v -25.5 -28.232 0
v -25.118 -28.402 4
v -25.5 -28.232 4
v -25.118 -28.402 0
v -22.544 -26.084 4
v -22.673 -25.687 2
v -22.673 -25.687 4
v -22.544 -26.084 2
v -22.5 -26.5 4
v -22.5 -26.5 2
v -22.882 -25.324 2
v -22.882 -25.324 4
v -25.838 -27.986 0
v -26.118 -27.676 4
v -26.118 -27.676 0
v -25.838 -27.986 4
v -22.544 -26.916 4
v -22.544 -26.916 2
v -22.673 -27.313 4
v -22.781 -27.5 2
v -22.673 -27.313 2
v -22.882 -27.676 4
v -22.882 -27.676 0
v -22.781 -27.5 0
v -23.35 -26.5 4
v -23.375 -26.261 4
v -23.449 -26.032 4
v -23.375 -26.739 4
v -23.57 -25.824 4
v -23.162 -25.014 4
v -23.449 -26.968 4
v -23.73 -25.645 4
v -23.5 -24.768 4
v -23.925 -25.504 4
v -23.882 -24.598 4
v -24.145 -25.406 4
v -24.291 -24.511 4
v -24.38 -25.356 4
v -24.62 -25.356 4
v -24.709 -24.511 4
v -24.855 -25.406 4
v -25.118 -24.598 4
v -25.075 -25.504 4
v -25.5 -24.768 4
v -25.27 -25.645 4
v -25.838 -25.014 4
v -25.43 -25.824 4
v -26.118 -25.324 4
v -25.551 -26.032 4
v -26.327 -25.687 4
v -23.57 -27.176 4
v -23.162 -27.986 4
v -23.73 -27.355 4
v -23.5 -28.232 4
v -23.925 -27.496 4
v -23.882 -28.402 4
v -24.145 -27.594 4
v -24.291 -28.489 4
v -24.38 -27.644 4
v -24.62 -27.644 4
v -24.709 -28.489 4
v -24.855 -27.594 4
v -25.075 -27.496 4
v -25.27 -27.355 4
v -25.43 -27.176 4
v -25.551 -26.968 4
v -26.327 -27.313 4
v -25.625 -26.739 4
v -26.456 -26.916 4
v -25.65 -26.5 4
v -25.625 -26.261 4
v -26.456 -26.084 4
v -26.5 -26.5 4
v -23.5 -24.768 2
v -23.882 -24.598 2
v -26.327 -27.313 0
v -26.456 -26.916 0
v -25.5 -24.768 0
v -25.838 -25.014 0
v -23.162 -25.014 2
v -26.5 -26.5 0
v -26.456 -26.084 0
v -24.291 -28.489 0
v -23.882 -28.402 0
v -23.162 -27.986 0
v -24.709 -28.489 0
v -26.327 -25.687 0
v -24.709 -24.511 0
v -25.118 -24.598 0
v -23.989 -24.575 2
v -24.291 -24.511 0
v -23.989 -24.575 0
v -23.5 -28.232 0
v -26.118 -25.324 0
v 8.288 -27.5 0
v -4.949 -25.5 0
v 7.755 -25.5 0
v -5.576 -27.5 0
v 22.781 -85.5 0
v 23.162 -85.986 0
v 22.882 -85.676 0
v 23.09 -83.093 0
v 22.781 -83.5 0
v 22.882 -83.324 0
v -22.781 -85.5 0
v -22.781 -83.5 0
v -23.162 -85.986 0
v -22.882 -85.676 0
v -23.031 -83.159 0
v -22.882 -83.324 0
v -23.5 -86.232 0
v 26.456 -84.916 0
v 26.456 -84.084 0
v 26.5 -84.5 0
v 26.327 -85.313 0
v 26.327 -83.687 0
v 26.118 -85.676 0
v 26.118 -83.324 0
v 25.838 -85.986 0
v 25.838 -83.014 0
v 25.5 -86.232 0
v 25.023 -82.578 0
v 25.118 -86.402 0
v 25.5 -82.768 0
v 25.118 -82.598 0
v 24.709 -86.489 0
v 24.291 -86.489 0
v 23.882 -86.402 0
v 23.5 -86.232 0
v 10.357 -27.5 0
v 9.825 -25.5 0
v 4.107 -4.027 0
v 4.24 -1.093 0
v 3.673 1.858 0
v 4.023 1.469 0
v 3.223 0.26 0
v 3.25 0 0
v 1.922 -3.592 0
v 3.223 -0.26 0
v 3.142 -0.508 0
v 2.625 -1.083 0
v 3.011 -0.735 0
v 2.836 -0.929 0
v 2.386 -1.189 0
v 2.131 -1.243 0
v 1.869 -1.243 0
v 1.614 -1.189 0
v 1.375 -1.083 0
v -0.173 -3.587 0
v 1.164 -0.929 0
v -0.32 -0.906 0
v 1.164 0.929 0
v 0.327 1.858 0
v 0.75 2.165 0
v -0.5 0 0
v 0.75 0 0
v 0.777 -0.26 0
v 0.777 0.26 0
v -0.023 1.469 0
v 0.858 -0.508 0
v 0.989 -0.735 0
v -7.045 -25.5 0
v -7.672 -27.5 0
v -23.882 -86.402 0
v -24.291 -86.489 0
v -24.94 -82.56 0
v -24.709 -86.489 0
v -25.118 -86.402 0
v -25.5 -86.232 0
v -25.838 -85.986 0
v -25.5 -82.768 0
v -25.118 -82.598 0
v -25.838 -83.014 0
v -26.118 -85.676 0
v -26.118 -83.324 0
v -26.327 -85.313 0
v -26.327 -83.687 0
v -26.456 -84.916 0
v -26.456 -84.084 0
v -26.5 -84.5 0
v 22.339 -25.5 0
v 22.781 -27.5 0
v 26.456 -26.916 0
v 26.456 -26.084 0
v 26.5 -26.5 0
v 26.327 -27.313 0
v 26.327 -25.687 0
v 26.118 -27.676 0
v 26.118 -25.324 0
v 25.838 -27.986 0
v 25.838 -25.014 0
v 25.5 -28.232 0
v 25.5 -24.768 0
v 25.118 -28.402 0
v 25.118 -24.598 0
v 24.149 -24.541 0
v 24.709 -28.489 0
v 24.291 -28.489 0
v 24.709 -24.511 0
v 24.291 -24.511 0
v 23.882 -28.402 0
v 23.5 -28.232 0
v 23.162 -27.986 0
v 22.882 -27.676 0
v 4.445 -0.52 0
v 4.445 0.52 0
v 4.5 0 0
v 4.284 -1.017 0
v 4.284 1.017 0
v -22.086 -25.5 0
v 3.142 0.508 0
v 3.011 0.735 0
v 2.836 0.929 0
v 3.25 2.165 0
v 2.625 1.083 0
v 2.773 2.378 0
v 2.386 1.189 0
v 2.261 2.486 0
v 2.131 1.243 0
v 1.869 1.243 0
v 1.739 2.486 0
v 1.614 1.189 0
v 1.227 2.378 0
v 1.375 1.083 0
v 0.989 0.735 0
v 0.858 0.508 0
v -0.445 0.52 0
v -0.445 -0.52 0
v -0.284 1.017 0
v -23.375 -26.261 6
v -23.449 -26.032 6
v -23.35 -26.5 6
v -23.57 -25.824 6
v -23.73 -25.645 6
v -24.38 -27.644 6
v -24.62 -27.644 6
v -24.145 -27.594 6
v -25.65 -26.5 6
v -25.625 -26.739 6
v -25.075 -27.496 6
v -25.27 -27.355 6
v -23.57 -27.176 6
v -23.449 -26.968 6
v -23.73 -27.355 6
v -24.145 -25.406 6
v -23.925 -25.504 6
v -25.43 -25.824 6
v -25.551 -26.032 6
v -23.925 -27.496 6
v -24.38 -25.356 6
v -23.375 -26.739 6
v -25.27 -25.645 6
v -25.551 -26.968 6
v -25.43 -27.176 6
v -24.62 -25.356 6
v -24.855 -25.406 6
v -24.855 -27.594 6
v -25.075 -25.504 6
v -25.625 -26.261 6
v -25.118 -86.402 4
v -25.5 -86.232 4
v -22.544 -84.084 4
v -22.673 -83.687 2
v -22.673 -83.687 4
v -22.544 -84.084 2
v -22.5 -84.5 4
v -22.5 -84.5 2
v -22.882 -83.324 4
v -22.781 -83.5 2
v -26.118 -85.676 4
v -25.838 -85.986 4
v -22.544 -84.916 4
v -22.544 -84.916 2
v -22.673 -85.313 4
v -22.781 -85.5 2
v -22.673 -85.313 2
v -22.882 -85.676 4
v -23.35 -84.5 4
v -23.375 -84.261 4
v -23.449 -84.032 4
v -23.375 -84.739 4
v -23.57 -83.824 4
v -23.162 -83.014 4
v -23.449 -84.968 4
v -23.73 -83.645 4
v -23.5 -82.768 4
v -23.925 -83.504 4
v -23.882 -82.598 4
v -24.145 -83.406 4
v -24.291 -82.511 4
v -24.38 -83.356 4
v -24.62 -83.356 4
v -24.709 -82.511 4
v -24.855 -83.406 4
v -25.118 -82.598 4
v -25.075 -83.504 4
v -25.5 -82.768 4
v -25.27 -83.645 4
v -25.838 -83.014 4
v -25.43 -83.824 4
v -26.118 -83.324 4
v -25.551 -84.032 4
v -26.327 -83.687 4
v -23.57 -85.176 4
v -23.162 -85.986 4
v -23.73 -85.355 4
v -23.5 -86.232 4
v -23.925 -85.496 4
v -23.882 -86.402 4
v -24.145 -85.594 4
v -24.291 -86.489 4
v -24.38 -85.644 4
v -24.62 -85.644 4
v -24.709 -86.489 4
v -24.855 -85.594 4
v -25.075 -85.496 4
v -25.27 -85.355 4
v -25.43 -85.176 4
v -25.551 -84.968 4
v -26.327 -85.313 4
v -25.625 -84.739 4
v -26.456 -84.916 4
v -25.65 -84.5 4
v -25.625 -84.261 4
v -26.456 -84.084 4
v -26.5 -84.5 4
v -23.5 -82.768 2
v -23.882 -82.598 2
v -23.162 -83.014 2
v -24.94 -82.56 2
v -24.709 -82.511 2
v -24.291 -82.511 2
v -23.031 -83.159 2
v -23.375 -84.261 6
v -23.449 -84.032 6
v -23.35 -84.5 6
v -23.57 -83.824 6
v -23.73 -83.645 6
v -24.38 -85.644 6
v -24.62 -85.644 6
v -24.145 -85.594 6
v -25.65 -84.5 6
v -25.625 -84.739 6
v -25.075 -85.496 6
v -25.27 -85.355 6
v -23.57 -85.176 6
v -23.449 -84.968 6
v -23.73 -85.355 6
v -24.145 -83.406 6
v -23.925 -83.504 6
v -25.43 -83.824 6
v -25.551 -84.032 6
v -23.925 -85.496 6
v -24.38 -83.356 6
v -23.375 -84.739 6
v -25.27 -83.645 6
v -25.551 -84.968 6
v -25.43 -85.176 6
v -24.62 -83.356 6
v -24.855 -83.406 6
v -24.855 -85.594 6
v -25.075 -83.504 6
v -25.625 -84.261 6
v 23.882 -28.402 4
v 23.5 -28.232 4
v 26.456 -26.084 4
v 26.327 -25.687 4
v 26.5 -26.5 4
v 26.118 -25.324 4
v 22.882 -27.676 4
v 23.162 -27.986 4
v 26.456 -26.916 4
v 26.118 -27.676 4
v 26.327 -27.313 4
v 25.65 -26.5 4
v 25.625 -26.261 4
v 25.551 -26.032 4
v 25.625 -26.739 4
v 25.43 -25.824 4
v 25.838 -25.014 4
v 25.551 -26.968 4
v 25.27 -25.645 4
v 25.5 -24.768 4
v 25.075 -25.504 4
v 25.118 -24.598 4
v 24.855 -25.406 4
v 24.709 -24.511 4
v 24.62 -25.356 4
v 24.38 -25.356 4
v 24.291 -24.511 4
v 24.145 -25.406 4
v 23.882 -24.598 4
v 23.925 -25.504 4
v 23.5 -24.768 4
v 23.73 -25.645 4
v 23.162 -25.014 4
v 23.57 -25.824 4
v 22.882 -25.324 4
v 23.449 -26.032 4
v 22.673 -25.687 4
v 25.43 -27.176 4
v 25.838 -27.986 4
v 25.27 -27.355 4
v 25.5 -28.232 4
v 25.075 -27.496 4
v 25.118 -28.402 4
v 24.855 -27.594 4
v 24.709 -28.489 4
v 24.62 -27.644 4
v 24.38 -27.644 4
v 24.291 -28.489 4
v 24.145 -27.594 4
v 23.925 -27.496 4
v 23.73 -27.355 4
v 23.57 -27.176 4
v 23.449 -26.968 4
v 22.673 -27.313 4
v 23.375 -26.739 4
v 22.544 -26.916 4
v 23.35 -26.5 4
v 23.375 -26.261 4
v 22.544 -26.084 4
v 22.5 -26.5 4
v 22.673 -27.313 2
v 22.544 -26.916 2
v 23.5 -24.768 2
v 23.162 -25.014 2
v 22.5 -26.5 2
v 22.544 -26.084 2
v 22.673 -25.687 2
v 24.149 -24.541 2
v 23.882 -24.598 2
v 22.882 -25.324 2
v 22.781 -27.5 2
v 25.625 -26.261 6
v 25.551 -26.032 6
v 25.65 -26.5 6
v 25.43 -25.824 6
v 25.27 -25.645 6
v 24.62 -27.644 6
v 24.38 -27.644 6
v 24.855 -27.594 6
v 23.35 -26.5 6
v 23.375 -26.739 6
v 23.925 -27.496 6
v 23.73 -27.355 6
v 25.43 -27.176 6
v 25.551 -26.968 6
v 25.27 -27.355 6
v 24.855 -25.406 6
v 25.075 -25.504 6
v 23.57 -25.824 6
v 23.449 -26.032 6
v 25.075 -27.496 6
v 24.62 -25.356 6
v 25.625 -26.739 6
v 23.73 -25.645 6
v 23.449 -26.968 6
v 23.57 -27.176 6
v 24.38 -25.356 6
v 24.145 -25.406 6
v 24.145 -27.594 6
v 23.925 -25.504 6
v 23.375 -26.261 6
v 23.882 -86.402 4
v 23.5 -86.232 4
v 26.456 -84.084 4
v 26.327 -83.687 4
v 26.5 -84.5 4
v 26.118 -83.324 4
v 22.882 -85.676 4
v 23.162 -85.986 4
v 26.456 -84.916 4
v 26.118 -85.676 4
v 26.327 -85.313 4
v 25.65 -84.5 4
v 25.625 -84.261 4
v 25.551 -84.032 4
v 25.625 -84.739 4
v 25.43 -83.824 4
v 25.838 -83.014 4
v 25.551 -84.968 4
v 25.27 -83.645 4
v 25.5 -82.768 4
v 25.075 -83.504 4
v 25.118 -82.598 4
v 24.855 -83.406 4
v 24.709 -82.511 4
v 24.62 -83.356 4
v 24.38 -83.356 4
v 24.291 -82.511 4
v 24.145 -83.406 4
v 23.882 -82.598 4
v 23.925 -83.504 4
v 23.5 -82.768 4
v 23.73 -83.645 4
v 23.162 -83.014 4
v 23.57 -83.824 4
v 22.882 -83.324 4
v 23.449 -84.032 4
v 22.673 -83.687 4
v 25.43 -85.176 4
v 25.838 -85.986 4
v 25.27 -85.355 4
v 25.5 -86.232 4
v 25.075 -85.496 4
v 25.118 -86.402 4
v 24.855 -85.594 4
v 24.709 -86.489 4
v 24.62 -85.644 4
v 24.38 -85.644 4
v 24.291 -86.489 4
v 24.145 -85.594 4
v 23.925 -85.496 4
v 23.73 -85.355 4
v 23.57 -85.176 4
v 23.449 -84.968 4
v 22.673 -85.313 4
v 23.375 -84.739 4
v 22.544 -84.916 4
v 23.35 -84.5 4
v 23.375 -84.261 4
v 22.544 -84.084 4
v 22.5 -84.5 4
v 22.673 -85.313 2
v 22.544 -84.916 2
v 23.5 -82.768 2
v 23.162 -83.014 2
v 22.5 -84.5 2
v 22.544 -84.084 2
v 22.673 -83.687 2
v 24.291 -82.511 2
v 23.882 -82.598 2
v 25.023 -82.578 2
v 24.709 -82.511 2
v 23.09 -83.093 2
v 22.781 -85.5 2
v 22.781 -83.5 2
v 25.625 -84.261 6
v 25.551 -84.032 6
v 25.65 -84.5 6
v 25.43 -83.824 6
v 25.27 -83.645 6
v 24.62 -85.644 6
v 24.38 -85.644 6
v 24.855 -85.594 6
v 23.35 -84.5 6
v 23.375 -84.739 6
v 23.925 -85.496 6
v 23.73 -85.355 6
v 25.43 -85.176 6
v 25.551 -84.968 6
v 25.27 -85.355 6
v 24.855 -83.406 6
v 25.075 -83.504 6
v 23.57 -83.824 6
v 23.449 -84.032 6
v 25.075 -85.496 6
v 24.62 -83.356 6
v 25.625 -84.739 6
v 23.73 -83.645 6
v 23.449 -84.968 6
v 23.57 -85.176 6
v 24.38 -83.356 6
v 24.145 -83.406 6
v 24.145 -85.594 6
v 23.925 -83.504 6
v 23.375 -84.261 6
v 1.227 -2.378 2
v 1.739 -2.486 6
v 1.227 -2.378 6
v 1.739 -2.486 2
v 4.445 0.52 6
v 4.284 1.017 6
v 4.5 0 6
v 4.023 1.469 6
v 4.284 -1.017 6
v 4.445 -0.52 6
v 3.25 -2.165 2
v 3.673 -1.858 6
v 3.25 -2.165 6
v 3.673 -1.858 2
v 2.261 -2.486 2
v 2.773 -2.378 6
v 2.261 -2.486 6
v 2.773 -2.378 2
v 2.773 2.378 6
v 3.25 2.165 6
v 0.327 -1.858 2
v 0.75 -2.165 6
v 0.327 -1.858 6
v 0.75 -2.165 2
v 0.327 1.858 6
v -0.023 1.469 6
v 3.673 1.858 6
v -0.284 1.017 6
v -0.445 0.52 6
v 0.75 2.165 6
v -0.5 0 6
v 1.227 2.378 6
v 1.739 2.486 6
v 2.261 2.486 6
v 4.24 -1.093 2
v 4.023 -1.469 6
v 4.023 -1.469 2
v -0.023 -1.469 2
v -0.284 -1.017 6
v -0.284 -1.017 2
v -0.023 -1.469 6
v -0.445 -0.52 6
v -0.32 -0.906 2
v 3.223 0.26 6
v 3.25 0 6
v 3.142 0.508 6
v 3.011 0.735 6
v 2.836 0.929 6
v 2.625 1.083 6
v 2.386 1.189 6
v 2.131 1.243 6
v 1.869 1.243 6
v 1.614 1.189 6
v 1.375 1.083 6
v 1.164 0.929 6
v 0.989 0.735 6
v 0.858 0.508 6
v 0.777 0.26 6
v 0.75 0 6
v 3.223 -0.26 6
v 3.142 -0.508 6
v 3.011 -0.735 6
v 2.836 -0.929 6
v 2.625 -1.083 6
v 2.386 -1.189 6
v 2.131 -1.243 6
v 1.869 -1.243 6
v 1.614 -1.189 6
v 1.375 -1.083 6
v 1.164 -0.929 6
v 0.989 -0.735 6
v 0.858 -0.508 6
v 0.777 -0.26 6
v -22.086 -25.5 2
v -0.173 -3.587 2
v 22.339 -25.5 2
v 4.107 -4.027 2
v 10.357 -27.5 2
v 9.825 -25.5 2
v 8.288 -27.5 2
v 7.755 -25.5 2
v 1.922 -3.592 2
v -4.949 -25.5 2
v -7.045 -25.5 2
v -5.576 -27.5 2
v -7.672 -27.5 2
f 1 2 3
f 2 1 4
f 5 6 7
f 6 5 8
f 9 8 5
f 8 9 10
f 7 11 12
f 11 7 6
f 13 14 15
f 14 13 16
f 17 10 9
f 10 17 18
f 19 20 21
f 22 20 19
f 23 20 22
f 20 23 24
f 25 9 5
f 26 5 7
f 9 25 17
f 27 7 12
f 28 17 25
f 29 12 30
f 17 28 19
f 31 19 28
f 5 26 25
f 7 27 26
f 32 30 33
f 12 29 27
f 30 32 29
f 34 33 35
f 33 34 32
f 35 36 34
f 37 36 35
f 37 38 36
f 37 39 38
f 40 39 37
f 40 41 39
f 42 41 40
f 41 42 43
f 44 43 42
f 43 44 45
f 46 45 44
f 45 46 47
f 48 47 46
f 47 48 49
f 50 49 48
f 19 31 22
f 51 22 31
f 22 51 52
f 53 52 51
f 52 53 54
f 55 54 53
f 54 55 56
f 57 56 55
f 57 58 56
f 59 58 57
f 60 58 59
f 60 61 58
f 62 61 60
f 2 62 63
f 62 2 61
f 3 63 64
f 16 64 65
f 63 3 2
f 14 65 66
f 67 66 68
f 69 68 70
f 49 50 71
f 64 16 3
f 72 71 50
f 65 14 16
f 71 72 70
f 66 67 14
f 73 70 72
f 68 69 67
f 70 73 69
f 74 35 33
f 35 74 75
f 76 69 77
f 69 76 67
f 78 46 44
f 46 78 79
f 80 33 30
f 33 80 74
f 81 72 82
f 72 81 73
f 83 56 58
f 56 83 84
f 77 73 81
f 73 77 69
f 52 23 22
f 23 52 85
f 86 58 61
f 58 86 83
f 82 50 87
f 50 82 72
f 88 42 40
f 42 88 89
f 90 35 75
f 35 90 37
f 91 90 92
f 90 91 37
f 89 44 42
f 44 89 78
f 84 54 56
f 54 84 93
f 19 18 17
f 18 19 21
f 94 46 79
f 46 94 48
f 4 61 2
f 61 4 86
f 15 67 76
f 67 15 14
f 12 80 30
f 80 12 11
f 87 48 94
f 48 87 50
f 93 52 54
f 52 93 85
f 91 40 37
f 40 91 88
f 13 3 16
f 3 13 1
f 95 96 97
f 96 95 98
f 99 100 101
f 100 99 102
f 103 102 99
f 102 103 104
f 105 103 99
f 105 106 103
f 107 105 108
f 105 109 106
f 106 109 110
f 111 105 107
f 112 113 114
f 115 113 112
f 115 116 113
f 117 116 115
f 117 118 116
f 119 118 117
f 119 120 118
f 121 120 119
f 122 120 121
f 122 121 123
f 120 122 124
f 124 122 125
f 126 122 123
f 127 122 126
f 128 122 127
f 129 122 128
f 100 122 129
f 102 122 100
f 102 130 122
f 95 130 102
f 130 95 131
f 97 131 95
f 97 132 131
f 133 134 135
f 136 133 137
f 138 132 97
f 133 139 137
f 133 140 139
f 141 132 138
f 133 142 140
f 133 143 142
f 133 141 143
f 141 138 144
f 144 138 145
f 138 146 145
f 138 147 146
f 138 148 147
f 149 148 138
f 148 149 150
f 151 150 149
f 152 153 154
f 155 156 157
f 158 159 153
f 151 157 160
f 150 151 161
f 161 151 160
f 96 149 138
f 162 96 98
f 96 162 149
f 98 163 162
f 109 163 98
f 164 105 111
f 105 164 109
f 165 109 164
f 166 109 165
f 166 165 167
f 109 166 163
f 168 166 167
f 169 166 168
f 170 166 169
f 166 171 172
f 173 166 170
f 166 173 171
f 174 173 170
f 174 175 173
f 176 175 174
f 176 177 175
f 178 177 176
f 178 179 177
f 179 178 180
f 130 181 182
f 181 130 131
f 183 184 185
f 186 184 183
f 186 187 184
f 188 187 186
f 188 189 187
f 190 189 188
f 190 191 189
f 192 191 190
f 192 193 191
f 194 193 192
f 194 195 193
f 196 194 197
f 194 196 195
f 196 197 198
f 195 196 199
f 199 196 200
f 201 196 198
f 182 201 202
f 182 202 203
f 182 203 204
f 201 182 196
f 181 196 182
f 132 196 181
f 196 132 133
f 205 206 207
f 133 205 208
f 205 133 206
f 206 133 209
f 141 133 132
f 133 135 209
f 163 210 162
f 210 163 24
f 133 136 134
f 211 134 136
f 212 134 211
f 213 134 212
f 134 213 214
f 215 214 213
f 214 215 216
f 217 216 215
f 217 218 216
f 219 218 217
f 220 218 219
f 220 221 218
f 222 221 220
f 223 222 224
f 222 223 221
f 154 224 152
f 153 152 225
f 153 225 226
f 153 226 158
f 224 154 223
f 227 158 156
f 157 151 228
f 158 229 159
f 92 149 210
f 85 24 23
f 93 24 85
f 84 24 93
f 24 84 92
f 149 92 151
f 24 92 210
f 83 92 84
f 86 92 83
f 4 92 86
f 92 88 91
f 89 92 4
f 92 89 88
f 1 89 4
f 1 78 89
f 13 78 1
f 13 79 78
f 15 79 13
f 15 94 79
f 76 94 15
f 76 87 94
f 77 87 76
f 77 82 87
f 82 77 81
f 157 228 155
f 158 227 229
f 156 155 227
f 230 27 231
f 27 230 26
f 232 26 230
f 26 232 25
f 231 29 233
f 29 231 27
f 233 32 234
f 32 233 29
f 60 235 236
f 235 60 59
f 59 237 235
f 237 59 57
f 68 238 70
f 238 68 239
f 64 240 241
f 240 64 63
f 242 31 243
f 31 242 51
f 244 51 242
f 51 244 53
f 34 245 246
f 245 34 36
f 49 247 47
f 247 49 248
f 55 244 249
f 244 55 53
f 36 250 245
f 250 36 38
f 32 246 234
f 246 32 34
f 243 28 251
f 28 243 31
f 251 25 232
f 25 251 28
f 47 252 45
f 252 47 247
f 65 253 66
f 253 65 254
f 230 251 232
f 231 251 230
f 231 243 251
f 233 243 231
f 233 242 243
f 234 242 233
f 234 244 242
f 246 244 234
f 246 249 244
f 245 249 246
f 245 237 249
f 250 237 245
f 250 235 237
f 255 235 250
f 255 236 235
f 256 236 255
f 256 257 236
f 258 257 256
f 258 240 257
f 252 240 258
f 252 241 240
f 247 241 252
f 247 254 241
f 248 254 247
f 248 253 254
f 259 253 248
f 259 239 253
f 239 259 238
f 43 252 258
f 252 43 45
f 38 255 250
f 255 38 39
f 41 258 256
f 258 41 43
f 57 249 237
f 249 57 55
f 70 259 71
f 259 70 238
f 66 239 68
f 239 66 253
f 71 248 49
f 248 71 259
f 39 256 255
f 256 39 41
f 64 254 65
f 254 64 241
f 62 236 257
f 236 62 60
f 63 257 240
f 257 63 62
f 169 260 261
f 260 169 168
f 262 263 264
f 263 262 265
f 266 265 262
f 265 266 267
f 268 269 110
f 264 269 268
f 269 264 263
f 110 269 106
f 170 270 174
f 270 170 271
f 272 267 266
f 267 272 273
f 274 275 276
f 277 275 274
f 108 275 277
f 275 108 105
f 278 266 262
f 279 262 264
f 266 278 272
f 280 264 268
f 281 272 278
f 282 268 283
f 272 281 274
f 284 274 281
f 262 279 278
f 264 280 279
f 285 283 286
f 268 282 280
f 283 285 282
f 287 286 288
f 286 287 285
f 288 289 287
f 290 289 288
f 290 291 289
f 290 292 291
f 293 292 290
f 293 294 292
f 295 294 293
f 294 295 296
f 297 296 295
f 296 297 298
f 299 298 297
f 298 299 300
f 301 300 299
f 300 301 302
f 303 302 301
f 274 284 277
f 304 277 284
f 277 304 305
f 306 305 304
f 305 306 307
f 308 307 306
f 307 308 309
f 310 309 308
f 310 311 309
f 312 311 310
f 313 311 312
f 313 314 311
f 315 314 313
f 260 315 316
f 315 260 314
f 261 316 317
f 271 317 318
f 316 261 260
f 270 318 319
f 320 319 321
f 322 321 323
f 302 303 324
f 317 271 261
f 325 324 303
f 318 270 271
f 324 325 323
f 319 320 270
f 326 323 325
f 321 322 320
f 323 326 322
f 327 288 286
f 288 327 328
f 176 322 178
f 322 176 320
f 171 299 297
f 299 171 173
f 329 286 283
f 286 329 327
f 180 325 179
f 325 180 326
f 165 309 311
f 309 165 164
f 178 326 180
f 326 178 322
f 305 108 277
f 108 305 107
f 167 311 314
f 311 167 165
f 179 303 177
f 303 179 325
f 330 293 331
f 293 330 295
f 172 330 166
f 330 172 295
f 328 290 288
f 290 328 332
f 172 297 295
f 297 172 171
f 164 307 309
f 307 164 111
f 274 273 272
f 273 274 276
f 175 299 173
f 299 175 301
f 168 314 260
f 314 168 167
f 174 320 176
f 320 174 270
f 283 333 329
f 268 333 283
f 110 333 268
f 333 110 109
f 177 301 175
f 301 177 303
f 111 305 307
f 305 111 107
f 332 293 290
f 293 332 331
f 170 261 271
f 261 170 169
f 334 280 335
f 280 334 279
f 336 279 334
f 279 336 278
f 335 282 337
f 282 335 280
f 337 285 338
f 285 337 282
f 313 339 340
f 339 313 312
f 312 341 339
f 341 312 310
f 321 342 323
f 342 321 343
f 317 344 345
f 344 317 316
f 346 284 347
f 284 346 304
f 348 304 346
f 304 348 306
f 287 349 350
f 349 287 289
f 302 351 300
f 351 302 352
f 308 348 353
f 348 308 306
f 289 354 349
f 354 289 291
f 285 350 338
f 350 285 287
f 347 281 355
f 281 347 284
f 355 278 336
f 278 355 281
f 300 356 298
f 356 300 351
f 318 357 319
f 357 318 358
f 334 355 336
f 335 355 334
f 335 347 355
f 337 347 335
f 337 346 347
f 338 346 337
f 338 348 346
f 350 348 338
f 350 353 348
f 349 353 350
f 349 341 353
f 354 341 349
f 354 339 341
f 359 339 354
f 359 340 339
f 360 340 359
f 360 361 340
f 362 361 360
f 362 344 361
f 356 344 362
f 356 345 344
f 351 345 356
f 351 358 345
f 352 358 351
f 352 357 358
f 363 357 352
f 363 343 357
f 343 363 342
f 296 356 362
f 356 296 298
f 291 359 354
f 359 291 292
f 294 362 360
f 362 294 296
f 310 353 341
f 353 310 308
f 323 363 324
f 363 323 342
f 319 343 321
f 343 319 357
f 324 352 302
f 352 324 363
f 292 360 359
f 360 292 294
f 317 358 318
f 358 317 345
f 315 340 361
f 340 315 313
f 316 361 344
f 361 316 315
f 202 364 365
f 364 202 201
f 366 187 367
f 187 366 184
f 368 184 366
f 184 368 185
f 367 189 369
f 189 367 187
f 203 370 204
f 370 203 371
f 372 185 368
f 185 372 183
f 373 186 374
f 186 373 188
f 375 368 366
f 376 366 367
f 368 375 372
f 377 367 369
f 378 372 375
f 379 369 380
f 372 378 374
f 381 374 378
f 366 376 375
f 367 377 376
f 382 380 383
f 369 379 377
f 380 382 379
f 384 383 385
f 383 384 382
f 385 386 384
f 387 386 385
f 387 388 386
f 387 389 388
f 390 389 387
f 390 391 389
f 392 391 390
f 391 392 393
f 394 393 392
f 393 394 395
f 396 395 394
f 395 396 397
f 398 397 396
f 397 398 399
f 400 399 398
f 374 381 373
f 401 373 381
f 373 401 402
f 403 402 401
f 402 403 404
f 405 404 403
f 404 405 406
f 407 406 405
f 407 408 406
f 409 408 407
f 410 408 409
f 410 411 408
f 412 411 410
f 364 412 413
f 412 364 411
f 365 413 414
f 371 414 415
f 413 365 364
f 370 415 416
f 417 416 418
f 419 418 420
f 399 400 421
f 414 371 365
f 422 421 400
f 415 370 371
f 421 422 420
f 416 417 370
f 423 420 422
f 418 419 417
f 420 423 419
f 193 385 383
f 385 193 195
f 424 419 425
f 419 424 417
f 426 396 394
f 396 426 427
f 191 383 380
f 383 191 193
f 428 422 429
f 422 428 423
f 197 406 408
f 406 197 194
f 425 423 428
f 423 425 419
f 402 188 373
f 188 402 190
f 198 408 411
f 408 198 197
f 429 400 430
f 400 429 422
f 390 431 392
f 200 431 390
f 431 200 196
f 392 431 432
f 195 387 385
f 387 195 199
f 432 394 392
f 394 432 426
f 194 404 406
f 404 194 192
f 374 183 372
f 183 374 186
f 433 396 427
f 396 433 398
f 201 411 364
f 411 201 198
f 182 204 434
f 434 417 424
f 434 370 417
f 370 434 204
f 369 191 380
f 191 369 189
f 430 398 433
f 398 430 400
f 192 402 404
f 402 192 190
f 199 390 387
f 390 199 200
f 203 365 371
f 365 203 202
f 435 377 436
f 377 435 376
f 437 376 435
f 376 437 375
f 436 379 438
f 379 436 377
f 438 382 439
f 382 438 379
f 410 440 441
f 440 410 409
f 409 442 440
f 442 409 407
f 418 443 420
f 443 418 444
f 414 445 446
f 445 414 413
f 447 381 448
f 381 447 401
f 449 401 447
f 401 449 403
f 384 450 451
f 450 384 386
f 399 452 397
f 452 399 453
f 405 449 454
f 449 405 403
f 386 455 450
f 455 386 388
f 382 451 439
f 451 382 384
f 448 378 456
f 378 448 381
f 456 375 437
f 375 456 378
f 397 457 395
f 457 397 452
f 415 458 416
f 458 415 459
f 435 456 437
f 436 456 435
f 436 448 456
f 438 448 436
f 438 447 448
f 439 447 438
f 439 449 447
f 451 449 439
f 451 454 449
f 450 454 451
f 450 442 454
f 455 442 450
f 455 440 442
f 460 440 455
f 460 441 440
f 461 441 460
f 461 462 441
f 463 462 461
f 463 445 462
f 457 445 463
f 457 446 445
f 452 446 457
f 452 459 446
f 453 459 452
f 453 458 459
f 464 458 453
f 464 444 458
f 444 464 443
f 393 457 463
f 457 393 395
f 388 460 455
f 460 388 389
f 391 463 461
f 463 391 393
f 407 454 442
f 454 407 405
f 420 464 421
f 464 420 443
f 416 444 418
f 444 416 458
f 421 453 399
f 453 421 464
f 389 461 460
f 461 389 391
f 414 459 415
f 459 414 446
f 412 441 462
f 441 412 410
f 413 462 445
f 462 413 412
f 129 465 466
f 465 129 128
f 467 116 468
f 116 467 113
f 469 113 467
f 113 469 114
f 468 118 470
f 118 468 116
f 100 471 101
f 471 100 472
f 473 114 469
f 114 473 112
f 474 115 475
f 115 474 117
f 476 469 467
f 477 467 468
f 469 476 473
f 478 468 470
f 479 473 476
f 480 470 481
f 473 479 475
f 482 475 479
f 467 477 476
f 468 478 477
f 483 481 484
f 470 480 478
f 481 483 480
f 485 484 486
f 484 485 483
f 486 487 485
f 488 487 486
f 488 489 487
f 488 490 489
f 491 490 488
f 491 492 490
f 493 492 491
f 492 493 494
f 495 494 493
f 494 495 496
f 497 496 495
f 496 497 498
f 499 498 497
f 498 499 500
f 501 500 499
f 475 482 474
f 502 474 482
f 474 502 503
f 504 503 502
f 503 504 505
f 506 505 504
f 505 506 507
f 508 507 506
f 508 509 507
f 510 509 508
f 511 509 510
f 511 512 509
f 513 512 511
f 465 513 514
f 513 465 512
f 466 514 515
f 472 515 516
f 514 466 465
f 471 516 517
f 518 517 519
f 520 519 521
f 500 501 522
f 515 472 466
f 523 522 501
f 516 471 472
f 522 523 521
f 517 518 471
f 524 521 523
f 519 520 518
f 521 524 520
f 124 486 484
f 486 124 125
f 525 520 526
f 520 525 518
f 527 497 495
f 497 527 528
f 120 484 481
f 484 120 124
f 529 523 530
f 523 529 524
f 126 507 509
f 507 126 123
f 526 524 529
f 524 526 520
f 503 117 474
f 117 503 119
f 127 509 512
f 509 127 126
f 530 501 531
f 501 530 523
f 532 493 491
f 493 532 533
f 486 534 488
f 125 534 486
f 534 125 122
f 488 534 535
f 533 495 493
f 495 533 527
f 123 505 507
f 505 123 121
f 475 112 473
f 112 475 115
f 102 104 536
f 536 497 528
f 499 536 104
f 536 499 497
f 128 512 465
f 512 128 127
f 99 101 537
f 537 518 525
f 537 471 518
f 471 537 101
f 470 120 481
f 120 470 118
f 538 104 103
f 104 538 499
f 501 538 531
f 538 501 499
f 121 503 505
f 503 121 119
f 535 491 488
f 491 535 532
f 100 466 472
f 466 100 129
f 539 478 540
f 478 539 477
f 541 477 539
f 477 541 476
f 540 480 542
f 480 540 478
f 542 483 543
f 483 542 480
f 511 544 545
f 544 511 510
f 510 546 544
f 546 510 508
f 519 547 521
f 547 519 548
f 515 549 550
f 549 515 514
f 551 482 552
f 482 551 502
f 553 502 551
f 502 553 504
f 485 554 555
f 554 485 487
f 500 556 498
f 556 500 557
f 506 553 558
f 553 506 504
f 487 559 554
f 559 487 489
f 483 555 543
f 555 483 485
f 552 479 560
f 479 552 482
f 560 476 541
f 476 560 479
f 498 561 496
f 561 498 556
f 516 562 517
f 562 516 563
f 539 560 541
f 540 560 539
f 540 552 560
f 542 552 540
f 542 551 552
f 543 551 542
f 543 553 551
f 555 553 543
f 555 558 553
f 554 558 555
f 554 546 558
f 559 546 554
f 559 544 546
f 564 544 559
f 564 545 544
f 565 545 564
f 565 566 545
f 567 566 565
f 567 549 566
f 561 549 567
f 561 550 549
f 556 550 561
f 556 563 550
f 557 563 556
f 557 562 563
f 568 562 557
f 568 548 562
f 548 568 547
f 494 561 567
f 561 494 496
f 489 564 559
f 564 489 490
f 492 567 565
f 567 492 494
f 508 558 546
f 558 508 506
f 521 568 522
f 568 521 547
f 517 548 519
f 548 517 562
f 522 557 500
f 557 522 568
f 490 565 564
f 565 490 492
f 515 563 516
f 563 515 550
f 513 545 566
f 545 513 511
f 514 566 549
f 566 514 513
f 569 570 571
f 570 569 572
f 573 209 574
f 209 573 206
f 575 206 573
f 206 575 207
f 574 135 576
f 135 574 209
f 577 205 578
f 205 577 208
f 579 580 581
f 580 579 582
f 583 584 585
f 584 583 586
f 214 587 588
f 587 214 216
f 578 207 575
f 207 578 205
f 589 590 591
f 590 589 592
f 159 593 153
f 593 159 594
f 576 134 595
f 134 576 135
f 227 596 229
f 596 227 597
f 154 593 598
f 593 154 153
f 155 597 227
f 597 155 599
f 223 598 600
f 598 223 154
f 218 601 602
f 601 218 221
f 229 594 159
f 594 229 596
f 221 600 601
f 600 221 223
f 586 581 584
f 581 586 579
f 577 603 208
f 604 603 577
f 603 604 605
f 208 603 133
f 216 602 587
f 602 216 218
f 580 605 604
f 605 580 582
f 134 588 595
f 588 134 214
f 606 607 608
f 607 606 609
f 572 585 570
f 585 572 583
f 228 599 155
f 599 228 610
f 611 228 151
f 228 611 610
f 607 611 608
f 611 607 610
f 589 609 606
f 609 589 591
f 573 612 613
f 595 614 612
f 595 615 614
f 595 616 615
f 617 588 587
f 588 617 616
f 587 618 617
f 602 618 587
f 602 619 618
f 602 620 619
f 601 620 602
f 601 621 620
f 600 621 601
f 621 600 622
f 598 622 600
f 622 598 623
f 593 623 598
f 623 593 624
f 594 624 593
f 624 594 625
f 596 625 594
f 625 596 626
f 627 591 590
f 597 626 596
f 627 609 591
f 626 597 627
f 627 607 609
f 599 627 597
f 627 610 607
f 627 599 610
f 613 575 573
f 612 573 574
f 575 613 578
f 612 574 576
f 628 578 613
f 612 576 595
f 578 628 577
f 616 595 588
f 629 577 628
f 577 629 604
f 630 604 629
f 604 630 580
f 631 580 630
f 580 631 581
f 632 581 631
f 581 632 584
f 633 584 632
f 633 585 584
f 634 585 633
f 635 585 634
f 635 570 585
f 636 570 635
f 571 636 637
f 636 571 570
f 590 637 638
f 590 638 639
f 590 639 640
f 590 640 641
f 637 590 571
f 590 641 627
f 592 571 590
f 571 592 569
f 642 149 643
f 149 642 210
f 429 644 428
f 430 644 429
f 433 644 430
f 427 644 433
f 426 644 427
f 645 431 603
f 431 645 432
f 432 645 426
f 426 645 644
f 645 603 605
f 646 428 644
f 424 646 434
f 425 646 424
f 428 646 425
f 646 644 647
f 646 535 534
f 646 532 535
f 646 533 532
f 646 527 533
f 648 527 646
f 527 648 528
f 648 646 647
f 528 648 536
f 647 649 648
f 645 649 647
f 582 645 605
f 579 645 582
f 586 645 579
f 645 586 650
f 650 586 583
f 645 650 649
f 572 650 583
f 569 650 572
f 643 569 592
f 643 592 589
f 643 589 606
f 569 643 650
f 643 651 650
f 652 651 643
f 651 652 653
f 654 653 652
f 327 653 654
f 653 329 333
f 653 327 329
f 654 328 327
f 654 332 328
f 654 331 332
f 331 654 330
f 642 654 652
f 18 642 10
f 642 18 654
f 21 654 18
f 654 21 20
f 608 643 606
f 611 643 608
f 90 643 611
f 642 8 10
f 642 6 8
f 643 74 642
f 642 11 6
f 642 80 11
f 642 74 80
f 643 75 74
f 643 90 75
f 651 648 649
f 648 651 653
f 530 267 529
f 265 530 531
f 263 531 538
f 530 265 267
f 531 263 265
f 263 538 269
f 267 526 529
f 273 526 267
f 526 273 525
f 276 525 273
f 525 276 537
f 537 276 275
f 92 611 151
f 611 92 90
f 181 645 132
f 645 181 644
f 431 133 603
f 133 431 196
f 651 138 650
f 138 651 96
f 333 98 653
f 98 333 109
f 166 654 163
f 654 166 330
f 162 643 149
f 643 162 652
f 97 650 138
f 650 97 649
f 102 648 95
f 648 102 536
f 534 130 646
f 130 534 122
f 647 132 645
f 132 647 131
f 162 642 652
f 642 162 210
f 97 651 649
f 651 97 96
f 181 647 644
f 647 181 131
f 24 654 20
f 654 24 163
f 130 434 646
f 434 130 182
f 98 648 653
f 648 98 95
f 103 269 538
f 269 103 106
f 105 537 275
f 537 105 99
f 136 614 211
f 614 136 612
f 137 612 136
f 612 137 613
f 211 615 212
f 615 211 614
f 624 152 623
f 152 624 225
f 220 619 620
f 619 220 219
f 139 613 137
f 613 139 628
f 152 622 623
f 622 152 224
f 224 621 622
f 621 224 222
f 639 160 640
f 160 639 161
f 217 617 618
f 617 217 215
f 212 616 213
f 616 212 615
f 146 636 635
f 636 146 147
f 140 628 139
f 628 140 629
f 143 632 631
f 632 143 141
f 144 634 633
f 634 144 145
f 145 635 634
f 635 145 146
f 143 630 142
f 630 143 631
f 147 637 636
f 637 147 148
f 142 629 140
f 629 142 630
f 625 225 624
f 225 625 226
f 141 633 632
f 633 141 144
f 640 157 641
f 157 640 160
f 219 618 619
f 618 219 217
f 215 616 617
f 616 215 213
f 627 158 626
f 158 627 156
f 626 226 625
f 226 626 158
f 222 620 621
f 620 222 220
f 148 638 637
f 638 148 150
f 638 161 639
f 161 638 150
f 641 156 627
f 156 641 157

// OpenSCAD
// -*- mode: SCAD ; c-file-style: "ellemtel" ; coding: utf-8 -*-
//
// Minimalist Frame to hang a Raspberry Pi on to one M3 screw.
//
// © 2017 Roland Sieker <ospalh@gmail.com>
// Licence: CC-BY-SA 4.0


hd = 2.5; // Hole diameter, so that the screws acts thread cutting
pd = 2.3; // Post diameter. Fix so it works with your printer tolerances
xd = 49;  // Distance between the hole centers in one direction
yd = 58;  //  Distance between the hole centers in the other direction
yeb = 23.5;  // Extra board dimension
xo = 2;  // Offset of the hanger hole.
// My acrylic frame had an almost convenient hole. It was offset from
// another part of the frame by 2 mm too little for this thing to by
// symmetrical.
posts = true;  // Posts to clip the Pi on or screw holes (false)
spr = 2.5;  // Screw post radius. How big a cylinder to put the screws in
pbr = 2;  // Similar for the posts
aw = 2;  // Arm width
ah = 2;  // Arm height
sph = 6;  // Height of the screw posts
pbh = 4;  // Similar for the post bases
ph = 2;  // Post height. Just needs to be higher than the PI PCB
ms = 0.01;  // Muggeseggele. To make the diferences render nicer in preview
clear = 0.5;  // Clearnace distance

$fs=0.1;


y1 = -1 * (yeb + spr + clear);
y2 = y1 - yd;

difference()
{
   union()
   {
      pposts_or_bases();
      arms();
   }
   nposts_or_bases();
}


module pposts_or_bases()
{
   translate([xo, 0, 0])
   {
      pscrew_post();
   }
   translate([-xd/2, y1, 0])
   {
      ppost_or_base();
   }
   translate([-xd/2, y2, 0])
   {
      ppost_or_base();
   }
   translate([xd/2, y1, 0])
   {
      ppost_or_base();
   }
   translate([xd/2, y2, 0])
   {
      ppost_or_base();
   }
}
module nposts_or_bases()
{
   translate([xo, 0, 0])
   {
      nscrew_post();
   }
   translate([-xd/2, y1, 0])
   {
      npost_or_base();
   }
   translate([-xd/2, y2, 0])
   {
      npost_or_base();
   }
   translate([xd/2, y1, 0])
   {
      npost_or_base();
   }
   translate([xd/2, y2, 0])
   {
      npost_or_base();
   }
}


module ppost_or_base()
{
   // Positiv space of the hole or post
   if (posts)
   {
      ppost_base();
   }
   else
   {
      pscrew_post();
   }
}
module npost_or_base()
{
   // Negative space of the hole or post. That is, the swrew hole
   if (posts)
   {
      npost_base();
   }
   else
   {
      nscrew_post();
   }
}
module pscrew_post()
{
   cylinder(r=spr, h=sph);
}
module nscrew_post()
{
   translate([0, 0, -ms])
   {
      cylinder(r=hd/2, h=sph+2*ms);
   }
}
module ppost_base()
{
   cylinder(r=pbr, h=pbh);
   cylinder(r=pd/2, h=pbh+ph);
}
module npost_base()
{
   // The post base is cherful. That is, all positive.
}

module arms()
{
   xl = xd/2 + xo;
   xr = xo - xd/2 ;

   // The math
   // The lengths …
   l1l = sqrt(y1*y1+xl*xl);
   r1l = sqrt(y1*y1+xr*xr);
   l2l = sqrt(y2*y2+xl*xl);
   r2l = sqrt(y2*y2+xr*xr);
   // …and the angles
   l1a = atan(xl/y1);
   r1a = atan(xr/y1);
   l2a = atan(xl/y2);
   r2a = atan(xr/y2);

   translate([0, 0, ah/2])
   {
      translate([xo, 0, 0])
      {
         // The hanger arms
         rotate(l1a)
         {
            translate([0, -l1l/2, 0])
            {
               cube([aw, l1l, ah], center=true);
            }
         }
         rotate(r1a)
         {
            translate([0, -r1l/2, 0])
            {
               cube([aw, r1l, ah], center=true);
            }
         }
         rotate(l2a)
         {
            translate([0, -l2l/2, 0])
            {
               cube([aw, l2l, ah], center=true);
            }
         }
         rotate(r2a)
         {
            translate([0, -r2l/2, 0])
            {
               cube([aw, r2l, ah], center=true);
            }
         }
      }
      // And the cross beams
      translate([0, y1, 0])
      {
         cube([xd, aw, ah], center=true);
      }
      translate([0, y2, 0])
      {
         cube([xd, aw, ah], center=true);
      }
   }
}
